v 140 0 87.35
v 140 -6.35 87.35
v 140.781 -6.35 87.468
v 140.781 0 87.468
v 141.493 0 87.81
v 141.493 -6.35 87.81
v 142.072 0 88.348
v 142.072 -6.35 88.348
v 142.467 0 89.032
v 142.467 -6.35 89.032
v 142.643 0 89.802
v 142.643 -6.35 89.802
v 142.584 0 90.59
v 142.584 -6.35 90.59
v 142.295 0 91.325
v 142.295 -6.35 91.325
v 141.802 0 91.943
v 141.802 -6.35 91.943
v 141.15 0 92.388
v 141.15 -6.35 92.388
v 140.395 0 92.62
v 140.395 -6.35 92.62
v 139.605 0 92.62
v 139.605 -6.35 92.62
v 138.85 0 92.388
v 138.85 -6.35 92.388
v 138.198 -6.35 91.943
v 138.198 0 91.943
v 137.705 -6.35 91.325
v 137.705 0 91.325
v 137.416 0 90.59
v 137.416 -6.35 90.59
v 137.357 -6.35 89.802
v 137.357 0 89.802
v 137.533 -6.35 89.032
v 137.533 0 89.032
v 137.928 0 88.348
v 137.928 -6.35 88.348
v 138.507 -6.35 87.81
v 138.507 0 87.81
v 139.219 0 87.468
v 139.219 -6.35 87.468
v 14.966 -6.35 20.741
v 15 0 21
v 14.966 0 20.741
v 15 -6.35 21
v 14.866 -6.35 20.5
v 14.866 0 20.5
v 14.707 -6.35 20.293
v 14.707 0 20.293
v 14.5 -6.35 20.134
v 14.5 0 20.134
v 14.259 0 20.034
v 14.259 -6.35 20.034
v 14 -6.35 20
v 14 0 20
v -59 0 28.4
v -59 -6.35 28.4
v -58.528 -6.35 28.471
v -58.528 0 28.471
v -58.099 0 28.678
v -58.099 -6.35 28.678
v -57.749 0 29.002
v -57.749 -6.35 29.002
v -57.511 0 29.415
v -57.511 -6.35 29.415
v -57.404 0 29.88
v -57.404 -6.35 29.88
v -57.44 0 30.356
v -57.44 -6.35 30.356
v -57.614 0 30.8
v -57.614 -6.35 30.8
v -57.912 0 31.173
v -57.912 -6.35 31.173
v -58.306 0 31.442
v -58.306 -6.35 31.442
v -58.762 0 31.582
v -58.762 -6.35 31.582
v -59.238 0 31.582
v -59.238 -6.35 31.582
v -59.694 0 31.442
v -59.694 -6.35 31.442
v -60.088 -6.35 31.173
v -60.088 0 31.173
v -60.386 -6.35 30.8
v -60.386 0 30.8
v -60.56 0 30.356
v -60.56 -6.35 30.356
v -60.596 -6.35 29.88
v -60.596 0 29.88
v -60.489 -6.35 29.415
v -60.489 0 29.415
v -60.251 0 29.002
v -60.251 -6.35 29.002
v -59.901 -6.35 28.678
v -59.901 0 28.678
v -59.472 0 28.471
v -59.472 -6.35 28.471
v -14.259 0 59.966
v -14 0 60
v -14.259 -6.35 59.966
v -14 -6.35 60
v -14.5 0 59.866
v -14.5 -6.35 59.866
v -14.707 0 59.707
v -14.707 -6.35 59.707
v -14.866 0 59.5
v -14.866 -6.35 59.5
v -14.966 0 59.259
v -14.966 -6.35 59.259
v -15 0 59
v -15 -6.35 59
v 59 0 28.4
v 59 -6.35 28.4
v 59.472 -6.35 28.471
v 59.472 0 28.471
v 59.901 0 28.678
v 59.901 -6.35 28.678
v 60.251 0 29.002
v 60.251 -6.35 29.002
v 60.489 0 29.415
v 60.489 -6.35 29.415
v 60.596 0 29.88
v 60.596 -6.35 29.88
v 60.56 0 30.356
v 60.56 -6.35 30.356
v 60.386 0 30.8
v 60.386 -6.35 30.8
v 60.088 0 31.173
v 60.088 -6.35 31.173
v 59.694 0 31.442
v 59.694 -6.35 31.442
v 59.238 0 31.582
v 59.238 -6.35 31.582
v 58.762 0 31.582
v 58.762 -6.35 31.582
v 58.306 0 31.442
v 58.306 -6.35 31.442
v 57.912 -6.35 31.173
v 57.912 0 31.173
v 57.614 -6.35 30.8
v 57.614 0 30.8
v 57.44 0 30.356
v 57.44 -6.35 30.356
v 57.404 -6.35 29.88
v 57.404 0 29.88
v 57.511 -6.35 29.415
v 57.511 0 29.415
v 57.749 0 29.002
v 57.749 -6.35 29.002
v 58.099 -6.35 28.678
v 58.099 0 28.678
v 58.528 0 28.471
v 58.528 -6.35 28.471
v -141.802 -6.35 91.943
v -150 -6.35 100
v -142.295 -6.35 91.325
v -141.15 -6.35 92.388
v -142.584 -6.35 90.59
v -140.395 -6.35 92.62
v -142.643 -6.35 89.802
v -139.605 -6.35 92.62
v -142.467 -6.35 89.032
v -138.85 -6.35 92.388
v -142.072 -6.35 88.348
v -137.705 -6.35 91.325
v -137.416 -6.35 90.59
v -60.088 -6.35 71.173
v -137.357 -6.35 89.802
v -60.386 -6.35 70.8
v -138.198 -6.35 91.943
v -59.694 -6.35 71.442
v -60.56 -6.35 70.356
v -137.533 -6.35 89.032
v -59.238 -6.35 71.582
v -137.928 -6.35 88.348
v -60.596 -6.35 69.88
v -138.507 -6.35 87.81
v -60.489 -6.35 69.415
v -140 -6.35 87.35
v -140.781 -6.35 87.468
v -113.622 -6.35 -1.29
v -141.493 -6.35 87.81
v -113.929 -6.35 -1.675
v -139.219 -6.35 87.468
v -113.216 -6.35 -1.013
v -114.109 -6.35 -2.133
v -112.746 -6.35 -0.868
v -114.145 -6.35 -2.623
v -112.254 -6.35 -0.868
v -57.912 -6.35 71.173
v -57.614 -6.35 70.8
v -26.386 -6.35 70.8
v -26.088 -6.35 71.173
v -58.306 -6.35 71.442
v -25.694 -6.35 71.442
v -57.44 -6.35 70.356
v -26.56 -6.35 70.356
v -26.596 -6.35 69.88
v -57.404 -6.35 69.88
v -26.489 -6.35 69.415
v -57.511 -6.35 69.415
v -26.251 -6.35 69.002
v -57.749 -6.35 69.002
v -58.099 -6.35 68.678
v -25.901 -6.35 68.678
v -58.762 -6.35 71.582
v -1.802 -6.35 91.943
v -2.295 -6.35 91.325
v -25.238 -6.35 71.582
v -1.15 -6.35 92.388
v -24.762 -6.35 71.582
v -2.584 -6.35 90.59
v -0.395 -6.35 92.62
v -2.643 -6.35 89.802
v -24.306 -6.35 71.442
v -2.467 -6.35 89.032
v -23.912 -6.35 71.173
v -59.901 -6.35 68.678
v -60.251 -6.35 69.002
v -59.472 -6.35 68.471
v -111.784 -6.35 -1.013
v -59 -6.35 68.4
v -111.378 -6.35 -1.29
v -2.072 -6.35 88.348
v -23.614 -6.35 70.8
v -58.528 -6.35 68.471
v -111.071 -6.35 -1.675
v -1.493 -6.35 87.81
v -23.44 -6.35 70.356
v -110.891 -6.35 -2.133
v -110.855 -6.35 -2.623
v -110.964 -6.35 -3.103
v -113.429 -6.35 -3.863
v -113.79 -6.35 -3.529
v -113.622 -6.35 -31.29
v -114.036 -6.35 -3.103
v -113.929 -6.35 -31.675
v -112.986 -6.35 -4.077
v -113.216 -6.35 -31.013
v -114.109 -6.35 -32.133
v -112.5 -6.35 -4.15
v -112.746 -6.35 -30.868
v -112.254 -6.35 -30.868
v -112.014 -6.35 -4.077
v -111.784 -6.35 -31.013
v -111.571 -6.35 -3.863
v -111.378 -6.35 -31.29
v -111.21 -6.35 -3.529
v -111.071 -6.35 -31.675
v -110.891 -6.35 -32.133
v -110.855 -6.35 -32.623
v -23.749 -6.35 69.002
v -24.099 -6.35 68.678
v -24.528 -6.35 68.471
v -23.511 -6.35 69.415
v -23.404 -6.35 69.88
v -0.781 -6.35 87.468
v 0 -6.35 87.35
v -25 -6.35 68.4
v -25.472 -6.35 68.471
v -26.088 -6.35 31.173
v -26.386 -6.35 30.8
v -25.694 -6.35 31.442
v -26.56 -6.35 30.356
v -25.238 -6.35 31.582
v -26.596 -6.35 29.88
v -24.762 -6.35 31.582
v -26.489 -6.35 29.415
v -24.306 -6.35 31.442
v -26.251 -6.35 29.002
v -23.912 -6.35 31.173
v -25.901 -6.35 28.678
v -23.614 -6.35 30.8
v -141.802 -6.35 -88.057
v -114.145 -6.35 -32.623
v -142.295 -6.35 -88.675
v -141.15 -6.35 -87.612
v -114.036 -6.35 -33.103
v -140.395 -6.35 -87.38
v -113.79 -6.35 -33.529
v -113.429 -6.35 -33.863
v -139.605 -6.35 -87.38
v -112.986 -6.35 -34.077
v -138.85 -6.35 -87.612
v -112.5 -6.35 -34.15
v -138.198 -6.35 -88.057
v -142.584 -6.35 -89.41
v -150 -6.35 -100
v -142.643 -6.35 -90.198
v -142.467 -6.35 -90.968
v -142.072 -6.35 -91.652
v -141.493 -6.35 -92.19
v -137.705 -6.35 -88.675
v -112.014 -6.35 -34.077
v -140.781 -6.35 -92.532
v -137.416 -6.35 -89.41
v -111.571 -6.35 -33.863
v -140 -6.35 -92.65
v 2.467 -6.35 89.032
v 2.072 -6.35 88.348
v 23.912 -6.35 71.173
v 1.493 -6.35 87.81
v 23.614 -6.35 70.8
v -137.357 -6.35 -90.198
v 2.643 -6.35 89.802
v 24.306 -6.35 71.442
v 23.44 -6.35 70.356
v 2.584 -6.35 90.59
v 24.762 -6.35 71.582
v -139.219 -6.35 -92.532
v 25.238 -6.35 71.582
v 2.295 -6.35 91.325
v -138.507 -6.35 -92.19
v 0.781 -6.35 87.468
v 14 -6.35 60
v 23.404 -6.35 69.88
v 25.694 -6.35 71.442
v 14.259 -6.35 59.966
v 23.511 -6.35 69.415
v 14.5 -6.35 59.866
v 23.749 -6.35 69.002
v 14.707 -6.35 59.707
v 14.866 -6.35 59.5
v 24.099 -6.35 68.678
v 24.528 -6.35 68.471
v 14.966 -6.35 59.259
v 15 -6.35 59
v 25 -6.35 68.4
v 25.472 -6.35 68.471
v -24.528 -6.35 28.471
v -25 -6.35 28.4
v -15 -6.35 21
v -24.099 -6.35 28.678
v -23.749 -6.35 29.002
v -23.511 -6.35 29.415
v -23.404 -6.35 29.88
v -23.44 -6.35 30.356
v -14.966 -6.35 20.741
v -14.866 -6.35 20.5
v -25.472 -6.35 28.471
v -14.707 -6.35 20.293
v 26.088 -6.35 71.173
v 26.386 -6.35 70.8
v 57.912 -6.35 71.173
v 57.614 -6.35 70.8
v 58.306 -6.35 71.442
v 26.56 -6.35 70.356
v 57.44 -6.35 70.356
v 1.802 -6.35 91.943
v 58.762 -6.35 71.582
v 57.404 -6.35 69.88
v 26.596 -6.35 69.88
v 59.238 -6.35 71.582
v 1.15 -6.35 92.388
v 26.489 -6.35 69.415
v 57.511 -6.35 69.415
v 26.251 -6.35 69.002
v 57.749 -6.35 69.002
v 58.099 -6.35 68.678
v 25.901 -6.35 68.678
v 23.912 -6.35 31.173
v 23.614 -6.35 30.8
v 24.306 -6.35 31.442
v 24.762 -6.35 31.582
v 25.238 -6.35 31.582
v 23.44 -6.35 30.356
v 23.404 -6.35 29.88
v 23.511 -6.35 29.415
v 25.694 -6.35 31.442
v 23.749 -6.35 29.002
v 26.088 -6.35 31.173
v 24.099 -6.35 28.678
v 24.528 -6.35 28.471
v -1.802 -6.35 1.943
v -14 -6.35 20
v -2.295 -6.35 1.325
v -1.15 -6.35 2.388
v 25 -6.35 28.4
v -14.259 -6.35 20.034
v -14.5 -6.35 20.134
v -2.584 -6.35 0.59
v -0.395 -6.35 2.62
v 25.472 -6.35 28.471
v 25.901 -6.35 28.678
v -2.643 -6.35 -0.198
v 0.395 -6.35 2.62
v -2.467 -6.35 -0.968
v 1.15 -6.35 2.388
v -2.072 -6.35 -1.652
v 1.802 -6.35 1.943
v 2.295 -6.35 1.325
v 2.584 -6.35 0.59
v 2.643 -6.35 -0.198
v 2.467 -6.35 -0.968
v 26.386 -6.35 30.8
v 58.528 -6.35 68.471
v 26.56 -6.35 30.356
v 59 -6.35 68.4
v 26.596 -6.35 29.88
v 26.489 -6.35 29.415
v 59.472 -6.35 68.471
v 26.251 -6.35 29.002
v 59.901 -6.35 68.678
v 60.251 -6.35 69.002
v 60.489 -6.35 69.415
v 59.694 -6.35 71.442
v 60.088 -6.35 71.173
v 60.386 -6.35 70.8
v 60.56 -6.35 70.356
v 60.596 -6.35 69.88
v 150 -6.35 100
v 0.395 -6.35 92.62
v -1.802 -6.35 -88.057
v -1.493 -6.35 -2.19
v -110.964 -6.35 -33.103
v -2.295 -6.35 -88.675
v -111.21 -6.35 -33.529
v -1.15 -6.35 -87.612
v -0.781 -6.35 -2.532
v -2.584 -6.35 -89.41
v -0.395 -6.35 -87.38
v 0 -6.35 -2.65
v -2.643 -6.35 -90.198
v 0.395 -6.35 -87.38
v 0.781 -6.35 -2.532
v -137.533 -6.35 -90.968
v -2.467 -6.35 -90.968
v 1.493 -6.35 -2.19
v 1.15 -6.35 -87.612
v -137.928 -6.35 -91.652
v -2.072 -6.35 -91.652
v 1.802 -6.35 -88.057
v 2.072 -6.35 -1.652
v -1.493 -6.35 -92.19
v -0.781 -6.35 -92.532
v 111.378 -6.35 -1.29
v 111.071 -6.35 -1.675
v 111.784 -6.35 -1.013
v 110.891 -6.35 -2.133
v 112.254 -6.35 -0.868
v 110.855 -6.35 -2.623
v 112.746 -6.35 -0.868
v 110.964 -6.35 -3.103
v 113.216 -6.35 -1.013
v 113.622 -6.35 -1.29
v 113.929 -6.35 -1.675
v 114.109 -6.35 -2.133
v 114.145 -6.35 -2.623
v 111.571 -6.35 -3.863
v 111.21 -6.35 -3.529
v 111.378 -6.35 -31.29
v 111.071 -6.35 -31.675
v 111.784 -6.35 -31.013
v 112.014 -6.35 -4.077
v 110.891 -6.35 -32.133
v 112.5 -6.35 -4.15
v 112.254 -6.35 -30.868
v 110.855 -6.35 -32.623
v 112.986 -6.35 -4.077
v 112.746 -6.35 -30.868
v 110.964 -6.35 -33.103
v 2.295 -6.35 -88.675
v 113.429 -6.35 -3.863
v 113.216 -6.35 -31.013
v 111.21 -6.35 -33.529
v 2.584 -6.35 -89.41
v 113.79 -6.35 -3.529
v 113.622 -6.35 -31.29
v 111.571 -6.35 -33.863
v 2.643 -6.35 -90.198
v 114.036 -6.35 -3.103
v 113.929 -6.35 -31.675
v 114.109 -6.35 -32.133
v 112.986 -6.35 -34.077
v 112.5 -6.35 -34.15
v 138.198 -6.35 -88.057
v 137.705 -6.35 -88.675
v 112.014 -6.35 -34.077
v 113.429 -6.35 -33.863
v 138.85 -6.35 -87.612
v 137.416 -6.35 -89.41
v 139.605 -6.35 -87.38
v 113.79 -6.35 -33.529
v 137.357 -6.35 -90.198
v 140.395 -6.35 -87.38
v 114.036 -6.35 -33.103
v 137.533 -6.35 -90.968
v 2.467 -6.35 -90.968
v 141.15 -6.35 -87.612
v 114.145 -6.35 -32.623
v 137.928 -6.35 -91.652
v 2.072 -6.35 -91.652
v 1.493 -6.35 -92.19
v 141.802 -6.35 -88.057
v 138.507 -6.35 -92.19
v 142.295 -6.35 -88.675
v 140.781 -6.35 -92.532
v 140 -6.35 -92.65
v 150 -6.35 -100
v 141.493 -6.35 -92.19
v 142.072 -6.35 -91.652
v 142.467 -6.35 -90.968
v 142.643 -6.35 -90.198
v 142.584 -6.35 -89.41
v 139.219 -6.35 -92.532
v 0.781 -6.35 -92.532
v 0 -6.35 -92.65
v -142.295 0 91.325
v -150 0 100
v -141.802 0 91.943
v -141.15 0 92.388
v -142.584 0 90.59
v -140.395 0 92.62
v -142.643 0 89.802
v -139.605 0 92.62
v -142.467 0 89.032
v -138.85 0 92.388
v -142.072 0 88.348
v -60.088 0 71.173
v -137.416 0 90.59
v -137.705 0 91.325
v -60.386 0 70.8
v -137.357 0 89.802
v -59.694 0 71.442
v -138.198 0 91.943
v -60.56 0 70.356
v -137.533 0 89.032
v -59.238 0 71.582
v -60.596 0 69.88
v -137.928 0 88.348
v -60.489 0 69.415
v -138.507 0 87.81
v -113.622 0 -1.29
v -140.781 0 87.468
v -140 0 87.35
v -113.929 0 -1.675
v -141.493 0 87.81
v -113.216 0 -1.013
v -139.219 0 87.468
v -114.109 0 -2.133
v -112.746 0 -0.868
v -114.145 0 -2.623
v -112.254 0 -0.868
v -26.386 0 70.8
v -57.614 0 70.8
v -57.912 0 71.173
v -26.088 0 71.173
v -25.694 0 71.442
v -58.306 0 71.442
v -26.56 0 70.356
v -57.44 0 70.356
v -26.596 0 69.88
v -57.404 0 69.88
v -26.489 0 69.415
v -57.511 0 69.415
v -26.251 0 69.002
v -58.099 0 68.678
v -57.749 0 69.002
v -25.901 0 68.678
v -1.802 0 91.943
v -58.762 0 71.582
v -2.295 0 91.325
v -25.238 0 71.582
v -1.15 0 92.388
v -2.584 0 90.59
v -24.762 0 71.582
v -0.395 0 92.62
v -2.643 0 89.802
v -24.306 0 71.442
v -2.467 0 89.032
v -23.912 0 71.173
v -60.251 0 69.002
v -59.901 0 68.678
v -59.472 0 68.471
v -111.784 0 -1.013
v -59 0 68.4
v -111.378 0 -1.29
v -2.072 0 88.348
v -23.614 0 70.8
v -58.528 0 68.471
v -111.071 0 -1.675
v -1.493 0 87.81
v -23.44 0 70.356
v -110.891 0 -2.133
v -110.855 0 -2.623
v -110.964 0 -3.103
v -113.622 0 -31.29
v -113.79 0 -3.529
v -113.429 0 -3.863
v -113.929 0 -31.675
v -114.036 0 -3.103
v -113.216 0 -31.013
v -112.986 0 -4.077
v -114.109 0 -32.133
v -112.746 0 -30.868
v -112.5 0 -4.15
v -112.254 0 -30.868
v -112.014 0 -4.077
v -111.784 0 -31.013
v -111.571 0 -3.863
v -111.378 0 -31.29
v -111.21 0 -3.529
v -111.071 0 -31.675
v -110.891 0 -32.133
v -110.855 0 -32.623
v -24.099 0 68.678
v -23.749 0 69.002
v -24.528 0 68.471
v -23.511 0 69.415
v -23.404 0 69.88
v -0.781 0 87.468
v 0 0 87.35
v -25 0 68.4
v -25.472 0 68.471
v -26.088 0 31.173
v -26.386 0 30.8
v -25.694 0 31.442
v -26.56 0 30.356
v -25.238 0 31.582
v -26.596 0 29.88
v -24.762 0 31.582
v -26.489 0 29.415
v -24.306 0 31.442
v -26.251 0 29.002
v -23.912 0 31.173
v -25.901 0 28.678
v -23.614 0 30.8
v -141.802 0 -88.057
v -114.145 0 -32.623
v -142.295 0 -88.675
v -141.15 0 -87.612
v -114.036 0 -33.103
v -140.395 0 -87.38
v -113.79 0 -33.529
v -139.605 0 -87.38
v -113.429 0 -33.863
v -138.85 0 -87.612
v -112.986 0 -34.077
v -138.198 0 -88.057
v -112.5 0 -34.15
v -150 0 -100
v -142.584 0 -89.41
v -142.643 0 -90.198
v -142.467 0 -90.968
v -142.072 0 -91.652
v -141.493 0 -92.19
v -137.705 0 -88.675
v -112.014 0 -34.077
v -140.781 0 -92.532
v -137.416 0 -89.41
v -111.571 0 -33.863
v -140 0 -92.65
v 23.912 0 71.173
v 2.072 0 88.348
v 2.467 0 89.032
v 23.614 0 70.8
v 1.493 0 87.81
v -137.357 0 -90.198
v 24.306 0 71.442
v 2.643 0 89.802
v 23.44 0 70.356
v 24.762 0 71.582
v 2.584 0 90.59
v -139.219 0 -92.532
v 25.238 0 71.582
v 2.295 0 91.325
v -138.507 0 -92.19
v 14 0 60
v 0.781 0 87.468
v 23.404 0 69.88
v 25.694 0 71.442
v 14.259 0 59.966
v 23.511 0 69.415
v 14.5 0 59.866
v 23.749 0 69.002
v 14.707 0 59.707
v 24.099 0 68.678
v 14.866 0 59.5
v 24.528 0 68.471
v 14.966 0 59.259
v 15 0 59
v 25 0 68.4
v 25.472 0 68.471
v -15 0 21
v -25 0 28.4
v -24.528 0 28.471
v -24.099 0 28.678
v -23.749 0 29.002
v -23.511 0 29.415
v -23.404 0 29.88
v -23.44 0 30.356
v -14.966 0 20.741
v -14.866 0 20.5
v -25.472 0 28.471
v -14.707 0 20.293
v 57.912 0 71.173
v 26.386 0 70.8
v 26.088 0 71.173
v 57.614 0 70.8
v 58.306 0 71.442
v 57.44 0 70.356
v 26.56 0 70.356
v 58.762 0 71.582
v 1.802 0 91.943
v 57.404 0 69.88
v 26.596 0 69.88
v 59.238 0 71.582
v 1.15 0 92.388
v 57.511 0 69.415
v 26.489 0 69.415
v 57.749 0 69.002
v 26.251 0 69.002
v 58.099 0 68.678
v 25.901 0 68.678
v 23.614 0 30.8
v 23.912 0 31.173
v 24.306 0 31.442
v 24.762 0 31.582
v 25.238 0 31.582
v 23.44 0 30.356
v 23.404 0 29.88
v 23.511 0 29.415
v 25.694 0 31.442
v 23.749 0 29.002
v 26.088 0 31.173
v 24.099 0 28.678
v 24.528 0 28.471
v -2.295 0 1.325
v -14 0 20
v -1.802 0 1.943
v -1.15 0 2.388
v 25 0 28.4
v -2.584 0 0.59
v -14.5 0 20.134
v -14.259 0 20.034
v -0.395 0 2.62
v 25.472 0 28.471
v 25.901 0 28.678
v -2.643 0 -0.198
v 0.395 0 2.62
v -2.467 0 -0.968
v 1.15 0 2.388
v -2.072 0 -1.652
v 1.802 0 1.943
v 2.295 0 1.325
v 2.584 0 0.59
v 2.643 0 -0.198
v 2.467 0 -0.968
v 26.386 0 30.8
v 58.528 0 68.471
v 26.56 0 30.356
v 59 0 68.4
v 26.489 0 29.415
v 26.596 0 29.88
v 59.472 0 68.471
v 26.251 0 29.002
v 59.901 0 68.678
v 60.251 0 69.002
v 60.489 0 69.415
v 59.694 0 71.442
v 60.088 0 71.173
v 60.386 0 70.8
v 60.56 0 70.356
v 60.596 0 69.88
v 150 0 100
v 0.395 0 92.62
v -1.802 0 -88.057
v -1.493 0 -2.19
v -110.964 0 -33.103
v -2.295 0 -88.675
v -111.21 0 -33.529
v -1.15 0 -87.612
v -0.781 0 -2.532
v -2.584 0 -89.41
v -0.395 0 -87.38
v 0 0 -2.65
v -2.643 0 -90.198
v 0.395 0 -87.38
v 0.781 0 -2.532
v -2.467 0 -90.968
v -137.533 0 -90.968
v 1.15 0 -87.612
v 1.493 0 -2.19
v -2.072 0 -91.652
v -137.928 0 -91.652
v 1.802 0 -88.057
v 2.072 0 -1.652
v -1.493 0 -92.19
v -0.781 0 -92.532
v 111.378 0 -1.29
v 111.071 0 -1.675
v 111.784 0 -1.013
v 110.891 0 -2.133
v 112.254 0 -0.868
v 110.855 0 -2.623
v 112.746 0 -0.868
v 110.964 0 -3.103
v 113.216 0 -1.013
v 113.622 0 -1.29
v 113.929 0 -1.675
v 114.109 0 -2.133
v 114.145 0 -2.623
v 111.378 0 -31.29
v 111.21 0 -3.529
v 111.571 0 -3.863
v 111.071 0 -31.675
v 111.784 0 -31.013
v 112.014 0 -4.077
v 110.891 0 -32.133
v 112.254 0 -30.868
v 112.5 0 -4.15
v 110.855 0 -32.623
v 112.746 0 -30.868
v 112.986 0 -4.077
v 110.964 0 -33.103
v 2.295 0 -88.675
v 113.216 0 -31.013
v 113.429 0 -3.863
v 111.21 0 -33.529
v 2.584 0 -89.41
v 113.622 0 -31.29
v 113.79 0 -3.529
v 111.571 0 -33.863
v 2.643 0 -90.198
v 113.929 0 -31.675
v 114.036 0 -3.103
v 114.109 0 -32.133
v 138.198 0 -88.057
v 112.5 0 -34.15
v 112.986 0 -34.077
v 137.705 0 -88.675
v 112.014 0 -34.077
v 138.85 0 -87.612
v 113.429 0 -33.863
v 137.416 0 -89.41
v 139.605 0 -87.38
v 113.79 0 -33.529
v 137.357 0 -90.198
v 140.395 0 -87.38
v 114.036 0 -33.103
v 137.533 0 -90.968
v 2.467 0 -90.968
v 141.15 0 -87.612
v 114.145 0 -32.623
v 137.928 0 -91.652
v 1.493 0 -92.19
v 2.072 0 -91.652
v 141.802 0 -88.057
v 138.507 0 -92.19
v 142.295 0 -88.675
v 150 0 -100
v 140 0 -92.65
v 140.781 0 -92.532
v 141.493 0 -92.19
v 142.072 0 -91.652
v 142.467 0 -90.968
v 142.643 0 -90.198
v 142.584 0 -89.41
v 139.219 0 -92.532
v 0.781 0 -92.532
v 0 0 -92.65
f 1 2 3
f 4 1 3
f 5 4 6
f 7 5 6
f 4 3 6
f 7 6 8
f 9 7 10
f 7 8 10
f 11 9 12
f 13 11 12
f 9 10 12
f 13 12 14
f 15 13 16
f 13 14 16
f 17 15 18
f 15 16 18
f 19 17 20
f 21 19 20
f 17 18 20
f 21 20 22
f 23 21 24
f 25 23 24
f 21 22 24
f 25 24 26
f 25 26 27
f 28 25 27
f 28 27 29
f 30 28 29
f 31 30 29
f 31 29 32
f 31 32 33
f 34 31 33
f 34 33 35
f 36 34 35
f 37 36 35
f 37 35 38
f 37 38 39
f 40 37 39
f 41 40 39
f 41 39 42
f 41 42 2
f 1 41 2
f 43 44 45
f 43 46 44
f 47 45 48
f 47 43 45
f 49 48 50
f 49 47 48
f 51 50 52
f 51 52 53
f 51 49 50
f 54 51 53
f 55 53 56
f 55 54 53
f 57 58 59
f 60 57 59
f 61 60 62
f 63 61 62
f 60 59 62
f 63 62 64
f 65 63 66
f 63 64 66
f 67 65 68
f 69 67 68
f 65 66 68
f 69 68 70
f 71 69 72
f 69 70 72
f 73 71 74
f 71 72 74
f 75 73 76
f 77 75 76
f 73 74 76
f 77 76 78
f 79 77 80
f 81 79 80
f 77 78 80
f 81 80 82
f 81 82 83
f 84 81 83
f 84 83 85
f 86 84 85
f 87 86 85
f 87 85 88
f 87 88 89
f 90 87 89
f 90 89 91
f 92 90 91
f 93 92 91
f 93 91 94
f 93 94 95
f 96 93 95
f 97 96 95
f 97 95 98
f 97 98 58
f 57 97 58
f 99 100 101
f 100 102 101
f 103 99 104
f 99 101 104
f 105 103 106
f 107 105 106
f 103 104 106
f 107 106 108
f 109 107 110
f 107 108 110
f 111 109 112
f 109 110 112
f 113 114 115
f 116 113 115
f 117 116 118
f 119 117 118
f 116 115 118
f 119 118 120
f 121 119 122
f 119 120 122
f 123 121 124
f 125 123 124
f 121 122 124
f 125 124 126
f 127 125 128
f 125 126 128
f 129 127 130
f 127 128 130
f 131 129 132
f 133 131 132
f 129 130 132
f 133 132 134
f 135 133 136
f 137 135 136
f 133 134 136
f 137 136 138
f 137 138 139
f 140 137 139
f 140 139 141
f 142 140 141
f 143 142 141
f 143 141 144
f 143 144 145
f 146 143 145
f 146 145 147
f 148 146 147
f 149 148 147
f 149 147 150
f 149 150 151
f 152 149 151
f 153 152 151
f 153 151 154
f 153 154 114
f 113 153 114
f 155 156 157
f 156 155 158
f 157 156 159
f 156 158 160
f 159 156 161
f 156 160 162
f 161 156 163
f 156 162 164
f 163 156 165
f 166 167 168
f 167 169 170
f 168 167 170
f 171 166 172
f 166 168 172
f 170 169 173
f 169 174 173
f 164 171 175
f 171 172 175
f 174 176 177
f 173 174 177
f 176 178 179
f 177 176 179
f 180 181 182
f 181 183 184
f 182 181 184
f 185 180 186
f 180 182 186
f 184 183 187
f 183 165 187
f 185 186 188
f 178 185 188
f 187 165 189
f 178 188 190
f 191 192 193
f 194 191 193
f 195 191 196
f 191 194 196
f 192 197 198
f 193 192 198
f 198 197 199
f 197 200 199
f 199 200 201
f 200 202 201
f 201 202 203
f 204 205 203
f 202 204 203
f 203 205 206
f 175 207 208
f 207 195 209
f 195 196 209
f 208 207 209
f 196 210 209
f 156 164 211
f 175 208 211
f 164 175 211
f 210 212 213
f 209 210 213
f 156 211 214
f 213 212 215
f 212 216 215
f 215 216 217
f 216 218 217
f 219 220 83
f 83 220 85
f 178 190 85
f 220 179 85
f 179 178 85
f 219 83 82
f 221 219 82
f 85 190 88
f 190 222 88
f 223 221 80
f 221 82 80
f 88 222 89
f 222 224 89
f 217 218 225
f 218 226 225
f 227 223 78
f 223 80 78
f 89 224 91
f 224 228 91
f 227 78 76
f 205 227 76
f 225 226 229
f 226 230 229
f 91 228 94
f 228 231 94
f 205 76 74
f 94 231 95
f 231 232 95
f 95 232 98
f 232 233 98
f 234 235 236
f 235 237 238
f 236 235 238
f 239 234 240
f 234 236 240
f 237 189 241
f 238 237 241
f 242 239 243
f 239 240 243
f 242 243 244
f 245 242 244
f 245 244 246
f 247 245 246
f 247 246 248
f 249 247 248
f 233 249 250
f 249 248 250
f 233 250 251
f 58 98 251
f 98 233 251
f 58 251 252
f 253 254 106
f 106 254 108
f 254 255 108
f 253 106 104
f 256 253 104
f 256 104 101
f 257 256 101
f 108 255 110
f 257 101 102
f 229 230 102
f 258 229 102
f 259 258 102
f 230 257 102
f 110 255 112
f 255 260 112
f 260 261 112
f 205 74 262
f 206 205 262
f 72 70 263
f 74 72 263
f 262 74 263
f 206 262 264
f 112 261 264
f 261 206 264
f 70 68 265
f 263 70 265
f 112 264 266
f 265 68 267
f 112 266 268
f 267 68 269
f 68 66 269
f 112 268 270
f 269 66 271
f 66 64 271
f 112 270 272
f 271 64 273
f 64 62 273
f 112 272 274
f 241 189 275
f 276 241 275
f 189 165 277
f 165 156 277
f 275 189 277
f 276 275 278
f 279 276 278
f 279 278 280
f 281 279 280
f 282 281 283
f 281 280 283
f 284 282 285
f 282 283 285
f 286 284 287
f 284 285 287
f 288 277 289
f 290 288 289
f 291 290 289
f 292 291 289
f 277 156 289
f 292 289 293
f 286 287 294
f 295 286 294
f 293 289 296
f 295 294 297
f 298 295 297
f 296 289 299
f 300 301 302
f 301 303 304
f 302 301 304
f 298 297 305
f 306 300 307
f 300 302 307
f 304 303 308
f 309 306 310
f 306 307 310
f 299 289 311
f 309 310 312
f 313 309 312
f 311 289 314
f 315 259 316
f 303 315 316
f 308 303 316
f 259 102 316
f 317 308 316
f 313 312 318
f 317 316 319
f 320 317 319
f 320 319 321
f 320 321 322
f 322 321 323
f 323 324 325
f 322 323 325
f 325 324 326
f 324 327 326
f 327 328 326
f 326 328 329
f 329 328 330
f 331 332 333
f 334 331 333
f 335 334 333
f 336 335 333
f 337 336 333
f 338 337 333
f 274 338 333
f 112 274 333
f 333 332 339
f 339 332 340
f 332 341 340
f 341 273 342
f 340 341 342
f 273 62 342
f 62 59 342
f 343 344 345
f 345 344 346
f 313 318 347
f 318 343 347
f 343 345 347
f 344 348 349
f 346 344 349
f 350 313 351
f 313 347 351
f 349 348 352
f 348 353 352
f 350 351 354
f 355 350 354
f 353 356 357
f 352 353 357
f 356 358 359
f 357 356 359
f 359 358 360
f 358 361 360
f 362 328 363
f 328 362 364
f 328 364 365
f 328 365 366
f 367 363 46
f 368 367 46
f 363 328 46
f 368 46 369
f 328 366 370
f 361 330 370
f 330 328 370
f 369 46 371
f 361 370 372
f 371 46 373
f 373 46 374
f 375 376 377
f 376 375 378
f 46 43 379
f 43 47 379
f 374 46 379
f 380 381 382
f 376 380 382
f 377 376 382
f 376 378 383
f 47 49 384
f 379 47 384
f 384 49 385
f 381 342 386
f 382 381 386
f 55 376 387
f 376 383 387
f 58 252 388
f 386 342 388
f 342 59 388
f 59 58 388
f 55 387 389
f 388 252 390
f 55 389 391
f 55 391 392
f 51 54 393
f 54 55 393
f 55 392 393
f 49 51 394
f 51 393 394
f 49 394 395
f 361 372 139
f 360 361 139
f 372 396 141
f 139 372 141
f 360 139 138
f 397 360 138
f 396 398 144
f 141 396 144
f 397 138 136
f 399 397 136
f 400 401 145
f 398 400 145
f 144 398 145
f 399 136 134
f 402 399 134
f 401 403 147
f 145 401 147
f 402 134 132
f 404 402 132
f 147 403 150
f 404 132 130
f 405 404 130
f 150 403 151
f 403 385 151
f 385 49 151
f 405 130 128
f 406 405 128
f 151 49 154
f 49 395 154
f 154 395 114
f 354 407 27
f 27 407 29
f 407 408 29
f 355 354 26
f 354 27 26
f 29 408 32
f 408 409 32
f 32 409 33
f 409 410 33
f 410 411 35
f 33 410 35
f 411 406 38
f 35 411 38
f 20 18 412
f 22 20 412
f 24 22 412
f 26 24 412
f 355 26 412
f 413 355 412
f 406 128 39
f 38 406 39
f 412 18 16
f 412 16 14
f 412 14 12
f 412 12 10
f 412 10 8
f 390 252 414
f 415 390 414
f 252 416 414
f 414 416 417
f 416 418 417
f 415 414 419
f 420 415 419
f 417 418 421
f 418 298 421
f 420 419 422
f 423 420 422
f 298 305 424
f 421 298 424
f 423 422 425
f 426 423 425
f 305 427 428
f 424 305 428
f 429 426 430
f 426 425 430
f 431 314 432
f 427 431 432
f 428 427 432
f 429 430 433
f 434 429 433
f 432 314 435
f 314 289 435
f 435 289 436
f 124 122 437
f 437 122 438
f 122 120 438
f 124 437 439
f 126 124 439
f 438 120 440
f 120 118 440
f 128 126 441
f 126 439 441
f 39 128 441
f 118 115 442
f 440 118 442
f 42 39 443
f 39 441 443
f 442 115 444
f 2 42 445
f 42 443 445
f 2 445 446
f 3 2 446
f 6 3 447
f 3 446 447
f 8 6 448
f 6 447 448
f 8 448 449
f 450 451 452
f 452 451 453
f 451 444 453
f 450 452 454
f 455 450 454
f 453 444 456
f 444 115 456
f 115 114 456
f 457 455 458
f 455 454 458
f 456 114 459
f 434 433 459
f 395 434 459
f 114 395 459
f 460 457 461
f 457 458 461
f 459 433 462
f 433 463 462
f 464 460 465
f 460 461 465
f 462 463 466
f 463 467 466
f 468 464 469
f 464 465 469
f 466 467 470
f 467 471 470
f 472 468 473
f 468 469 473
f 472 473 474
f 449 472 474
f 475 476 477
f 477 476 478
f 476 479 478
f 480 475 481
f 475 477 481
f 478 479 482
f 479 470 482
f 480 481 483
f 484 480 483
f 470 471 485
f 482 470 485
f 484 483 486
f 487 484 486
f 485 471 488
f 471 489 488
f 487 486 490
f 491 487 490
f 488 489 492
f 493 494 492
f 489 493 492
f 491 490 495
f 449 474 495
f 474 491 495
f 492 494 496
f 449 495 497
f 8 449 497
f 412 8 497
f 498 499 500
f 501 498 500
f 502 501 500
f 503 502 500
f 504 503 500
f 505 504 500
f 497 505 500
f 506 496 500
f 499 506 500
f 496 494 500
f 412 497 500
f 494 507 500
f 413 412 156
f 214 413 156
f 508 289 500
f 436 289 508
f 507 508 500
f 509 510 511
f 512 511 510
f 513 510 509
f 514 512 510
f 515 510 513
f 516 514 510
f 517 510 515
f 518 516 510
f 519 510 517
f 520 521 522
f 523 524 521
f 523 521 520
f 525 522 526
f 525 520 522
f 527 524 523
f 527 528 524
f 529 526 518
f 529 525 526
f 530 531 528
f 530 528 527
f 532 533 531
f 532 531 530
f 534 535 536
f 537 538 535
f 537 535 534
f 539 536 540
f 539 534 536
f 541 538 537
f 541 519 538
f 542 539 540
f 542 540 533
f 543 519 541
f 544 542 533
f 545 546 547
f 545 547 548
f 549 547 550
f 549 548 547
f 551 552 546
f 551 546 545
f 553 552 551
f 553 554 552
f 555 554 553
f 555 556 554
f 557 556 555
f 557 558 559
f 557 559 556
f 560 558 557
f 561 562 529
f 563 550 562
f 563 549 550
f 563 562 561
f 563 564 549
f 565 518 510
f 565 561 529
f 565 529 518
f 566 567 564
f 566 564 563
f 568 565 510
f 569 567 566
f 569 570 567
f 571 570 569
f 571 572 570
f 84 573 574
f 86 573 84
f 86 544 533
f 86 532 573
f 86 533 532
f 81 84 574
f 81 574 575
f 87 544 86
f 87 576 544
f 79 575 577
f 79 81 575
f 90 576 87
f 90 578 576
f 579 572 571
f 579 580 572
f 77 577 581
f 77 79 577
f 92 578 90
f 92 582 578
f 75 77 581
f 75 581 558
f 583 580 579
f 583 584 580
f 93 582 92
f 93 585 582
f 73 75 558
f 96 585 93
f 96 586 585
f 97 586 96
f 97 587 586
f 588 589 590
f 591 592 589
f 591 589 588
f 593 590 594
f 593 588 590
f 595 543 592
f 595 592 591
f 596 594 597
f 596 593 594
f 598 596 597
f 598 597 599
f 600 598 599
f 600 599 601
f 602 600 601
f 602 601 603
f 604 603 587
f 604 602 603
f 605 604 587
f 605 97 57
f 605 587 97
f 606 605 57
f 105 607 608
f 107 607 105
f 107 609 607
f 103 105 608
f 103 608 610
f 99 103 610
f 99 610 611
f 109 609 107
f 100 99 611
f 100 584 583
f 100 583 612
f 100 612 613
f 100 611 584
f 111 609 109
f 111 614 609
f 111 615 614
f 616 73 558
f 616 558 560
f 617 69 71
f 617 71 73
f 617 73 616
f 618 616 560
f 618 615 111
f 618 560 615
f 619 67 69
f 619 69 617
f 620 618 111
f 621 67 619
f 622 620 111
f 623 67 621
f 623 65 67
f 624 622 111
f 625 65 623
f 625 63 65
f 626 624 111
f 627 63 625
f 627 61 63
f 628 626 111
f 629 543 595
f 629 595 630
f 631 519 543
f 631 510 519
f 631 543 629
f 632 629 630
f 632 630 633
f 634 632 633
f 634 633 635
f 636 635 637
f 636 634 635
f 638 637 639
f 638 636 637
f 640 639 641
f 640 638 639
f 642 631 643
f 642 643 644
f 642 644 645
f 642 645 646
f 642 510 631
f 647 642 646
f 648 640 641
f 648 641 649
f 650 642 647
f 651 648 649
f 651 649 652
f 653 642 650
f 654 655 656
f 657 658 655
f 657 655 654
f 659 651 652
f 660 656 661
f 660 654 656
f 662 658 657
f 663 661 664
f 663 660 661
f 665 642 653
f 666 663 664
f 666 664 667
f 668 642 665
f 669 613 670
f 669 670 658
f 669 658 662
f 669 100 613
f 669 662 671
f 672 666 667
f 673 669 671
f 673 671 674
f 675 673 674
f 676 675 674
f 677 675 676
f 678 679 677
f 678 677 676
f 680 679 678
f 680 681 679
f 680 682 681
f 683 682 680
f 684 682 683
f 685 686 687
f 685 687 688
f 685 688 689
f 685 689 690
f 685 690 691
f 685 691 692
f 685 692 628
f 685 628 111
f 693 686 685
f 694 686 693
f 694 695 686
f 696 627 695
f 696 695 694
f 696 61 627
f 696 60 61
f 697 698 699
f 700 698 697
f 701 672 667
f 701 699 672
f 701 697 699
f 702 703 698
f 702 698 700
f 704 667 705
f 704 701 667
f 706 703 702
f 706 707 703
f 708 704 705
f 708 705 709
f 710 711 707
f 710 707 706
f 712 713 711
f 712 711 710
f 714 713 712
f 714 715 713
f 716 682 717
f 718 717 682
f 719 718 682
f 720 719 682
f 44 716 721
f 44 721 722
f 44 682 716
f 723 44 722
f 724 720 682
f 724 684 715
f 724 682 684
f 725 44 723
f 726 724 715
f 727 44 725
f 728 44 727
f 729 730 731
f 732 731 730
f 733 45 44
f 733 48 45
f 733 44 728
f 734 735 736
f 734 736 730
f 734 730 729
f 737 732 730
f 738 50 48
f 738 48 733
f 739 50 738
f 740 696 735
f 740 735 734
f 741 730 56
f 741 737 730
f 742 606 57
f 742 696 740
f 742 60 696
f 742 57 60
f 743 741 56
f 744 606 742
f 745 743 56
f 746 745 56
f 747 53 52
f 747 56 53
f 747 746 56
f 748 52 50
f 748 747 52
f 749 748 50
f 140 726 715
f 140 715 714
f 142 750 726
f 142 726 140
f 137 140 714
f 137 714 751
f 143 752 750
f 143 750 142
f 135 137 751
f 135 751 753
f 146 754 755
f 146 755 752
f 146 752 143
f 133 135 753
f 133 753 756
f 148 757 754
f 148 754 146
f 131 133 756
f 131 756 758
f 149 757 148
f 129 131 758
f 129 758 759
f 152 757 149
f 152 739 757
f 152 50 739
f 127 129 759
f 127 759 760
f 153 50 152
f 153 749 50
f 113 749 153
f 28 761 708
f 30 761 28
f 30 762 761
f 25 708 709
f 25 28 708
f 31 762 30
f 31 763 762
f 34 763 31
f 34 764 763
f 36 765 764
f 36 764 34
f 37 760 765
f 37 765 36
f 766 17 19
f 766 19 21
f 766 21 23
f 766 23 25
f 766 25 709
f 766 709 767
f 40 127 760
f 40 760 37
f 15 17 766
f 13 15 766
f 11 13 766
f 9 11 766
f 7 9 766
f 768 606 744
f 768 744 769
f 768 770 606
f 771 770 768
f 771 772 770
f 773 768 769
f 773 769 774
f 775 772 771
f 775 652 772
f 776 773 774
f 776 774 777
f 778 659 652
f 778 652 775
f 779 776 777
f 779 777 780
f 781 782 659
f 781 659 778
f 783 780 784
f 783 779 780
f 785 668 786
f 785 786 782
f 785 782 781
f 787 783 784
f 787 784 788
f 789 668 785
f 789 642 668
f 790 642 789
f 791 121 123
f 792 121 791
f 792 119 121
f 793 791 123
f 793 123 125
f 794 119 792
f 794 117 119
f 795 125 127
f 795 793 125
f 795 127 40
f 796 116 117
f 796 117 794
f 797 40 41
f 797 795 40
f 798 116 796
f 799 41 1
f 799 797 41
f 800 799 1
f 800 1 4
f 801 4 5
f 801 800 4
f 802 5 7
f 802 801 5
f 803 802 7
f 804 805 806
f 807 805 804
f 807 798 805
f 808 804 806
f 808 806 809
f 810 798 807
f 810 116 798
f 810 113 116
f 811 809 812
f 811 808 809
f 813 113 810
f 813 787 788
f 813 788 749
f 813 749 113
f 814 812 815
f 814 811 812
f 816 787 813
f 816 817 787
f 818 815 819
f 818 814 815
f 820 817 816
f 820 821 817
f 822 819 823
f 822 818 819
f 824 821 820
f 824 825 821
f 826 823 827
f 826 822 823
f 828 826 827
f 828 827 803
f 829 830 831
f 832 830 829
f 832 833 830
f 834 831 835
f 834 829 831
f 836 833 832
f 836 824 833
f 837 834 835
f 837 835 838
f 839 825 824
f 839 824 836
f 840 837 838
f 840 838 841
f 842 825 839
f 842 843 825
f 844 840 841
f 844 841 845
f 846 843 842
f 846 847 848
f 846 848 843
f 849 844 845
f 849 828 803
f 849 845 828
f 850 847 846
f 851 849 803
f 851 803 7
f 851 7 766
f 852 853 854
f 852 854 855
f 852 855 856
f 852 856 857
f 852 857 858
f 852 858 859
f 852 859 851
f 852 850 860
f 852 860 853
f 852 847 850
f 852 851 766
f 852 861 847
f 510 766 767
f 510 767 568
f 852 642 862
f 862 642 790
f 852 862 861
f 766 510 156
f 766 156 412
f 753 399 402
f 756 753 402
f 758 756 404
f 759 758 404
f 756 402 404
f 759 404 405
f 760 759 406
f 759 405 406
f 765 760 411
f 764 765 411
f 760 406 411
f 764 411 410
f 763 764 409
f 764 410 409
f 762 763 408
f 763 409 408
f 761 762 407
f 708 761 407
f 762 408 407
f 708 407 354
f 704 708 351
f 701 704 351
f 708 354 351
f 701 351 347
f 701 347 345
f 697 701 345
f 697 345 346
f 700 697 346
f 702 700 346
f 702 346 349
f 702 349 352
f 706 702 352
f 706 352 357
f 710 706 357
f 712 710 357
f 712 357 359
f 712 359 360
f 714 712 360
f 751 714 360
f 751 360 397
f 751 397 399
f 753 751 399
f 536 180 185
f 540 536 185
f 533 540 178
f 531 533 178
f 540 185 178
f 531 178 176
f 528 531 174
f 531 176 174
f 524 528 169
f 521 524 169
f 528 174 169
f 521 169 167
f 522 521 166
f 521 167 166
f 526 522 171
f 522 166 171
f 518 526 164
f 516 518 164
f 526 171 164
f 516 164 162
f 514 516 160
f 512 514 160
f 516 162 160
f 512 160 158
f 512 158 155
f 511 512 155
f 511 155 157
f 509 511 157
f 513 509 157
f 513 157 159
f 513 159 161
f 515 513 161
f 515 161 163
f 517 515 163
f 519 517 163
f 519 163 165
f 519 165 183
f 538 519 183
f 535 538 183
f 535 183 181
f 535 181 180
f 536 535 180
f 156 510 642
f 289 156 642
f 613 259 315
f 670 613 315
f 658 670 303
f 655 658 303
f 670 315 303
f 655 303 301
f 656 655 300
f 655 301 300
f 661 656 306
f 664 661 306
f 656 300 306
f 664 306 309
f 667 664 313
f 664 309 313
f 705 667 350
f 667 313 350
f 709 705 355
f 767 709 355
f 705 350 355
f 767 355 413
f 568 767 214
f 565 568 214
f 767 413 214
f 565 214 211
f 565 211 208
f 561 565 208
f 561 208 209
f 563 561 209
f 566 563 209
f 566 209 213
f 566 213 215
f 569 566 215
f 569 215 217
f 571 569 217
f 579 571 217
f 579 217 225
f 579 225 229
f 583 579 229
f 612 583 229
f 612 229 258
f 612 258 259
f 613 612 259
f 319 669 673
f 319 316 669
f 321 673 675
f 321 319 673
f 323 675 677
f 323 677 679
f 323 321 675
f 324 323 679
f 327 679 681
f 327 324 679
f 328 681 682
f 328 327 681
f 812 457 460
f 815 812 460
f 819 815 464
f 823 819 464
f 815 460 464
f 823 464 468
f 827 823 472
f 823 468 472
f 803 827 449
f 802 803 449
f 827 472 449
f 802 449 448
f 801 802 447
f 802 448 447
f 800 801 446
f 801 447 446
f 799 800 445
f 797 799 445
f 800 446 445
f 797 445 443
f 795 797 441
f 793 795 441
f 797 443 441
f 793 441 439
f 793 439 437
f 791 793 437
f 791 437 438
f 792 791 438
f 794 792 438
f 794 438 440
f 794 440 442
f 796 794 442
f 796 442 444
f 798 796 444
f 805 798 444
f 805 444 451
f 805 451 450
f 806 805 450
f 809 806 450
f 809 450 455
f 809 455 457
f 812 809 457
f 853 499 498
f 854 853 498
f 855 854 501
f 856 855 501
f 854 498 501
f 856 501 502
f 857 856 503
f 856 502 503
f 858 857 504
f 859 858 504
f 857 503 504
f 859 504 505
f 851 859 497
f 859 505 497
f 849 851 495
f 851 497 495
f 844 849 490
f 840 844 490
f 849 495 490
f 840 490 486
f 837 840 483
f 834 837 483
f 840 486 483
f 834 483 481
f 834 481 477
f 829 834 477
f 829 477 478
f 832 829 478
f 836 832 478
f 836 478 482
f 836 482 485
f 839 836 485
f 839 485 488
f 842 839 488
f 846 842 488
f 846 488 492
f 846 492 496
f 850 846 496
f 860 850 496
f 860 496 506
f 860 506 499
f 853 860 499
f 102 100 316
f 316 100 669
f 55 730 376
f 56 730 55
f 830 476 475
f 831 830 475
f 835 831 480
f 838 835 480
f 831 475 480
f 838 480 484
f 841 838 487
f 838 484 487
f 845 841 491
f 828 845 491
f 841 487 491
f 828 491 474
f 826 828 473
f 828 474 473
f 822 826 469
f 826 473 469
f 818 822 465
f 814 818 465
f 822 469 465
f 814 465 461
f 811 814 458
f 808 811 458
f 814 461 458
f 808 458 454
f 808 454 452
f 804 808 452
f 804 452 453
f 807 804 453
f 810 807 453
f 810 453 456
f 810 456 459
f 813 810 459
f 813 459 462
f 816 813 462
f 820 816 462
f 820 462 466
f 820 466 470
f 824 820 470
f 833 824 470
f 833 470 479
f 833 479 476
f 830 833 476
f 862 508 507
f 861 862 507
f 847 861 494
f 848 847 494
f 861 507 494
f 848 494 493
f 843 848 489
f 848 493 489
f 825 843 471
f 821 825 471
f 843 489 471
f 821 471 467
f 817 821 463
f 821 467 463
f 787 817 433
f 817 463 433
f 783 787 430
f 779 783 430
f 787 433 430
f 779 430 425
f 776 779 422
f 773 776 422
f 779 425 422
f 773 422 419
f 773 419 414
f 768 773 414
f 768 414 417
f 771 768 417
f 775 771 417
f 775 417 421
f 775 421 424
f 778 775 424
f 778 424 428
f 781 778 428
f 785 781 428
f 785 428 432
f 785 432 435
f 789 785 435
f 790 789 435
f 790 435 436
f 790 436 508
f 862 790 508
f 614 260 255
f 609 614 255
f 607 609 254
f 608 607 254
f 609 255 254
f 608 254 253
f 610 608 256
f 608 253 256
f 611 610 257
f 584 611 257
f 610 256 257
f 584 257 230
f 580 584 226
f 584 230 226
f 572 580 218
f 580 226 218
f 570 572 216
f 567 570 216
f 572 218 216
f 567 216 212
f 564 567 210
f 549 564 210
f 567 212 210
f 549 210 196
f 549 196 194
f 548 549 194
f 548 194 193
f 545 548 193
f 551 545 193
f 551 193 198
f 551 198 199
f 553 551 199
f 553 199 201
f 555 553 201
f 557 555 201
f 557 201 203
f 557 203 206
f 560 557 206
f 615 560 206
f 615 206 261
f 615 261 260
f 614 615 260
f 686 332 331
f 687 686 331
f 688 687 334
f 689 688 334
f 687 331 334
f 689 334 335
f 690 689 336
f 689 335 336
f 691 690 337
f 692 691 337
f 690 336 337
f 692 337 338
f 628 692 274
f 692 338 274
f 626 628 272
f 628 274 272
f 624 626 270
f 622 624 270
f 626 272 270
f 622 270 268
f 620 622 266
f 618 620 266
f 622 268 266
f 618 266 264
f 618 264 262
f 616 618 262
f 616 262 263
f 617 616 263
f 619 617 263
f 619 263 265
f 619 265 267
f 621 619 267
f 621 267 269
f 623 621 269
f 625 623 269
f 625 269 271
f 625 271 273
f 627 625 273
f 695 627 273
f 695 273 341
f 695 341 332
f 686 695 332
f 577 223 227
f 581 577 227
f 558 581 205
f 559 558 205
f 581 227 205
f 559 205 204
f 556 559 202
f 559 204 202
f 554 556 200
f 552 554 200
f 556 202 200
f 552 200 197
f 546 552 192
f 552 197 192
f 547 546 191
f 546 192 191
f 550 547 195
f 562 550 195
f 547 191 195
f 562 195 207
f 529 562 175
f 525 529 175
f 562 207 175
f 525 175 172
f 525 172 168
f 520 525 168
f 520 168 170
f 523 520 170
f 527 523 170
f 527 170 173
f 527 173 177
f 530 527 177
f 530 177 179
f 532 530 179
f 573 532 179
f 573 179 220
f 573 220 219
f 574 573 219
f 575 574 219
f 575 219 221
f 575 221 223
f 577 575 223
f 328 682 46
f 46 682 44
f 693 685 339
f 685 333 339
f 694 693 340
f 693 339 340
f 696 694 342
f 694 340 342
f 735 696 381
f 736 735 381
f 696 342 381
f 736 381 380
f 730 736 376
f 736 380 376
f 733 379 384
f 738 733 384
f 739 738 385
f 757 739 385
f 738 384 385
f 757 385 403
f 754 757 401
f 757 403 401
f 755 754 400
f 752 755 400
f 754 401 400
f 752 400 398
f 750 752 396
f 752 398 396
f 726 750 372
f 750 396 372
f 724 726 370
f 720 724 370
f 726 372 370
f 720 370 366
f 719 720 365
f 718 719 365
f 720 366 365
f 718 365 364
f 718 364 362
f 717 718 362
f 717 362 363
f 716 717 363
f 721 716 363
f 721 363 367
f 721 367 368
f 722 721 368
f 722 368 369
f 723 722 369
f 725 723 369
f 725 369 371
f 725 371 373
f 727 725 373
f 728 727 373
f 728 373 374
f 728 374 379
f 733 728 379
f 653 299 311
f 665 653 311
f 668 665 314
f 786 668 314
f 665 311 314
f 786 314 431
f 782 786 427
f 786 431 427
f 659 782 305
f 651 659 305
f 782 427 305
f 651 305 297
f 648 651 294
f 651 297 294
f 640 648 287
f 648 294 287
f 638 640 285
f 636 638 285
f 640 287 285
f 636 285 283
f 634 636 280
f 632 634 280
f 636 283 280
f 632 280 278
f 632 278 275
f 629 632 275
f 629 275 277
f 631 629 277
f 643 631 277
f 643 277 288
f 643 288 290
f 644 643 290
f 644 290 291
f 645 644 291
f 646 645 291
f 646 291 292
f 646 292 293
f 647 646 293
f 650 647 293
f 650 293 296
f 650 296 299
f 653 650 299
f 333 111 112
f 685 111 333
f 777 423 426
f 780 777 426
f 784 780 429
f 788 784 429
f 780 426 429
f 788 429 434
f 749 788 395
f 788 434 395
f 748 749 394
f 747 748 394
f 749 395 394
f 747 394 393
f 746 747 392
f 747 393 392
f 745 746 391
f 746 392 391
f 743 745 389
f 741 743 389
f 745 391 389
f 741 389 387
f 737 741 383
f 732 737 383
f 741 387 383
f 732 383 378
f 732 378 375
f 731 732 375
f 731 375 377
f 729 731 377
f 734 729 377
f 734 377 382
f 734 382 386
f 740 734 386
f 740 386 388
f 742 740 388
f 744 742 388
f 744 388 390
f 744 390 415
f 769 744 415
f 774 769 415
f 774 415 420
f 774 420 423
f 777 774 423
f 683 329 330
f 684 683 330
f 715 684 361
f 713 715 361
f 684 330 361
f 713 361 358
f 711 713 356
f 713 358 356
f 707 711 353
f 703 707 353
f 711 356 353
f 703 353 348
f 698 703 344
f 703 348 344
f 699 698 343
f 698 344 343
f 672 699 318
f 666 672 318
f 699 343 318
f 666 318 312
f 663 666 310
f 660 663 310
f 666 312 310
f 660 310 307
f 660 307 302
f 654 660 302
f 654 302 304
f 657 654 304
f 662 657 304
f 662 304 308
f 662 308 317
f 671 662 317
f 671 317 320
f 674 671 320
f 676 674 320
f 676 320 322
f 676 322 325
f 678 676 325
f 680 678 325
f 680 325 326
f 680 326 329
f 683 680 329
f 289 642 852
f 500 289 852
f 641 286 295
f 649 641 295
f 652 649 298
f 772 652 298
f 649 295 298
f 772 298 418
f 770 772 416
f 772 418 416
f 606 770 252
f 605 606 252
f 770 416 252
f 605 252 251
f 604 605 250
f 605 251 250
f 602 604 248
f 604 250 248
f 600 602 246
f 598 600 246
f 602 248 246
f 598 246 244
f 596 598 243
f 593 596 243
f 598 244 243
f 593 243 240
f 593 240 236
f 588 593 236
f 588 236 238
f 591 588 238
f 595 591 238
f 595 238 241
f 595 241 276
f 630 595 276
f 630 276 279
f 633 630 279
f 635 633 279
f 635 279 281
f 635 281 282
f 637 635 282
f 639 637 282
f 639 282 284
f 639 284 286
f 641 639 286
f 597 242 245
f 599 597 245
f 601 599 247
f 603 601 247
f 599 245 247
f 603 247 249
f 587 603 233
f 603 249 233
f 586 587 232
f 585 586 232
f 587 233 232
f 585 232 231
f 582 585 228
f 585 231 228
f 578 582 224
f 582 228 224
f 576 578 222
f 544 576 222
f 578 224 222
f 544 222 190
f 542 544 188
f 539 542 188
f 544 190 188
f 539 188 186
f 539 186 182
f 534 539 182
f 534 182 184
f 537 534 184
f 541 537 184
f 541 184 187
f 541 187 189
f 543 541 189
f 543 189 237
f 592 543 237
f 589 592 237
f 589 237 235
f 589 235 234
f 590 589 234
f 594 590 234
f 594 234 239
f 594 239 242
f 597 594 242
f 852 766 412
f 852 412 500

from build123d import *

# Parameters (mm, degrees)
SKETCH1_W                   = 300
SKETCH1_H                   = 200
SKETCH1_W_2                 = 30
SKETCH1_H_2                 = 40
BOSS_EXTRUDE1_DEPTH         = 6.35
TAP_DRILL_FOR_M4X0_7_TAP1_D = 3.3
M3_CLEARANCE_HOLE1_D        = 3.2
M5_CLEARANCE_HOLE1_D        = 5.3
FILLET1_R                   = 1


with BuildPart() as part:
    # Sketch1 → Boss-Extrude1 (new body)
    with BuildSketch(Plane(origin=(0, 0, 0), x_dir=(1, 0, 0), z_dir=(0, 1, 0))):
        Rectangle(SKETCH1_W, SKETCH1_H)
        with Locations((0, -40)):
            Rectangle(SKETCH1_W_2, SKETCH1_H_2, mode=Mode.SUBTRACT)
    extrude(amount=-BOSS_EXTRUDE1_DEPTH)

    # Tap Drill for M4x0.7 Tap1 (through all)
    with Locations(Plane(origin=(-112.5, 0, -32.5), x_dir=(0, 0, 1), z_dir=(0, 1, 0))):
        with Locations((0, 0), (30, 0), (0, 225), (30, 225)):
            Hole(TAP_DRILL_FOR_M4X0_7_TAP1_D / 2)

    # M3 Clearance Hole1 (through all)
    with Locations(Plane(origin=(-59, 0, 30), x_dir=(0, 0, 1), z_dir=(0, 1, 0))):
        with Locations((0, 0), (0, 34), (40, 0), (40, 34), (0, 84), (0, 118), (40, 84), (40, 118)):
            Hole(M3_CLEARANCE_HOLE1_D / 2)

    # M5 Clearance Hole1 (through all)
    with Locations(Plane(origin=(-140, 0, -90), x_dir=(0, 0, 1), z_dir=(0, 1, 0))):
        with Locations((0, 0), (0, 140), (0, 280), (180, 280), (180, 140), (180, 0), (90, 140)):
            Hole(M5_CLEARANCE_HOLE1_D / 2)

    # Fillet1
    fillet1_edges = [part.edges().sort_by_distance(p)[0] for p in [
        (15, -3.175, 20),
        (15, -3.175, 60),
        (-15, -3.175, 60),
        (-15, -3.175, 20),
    ]]
    fillet(fillet1_edges, radius=FILLET1_R)


solid = part.part
